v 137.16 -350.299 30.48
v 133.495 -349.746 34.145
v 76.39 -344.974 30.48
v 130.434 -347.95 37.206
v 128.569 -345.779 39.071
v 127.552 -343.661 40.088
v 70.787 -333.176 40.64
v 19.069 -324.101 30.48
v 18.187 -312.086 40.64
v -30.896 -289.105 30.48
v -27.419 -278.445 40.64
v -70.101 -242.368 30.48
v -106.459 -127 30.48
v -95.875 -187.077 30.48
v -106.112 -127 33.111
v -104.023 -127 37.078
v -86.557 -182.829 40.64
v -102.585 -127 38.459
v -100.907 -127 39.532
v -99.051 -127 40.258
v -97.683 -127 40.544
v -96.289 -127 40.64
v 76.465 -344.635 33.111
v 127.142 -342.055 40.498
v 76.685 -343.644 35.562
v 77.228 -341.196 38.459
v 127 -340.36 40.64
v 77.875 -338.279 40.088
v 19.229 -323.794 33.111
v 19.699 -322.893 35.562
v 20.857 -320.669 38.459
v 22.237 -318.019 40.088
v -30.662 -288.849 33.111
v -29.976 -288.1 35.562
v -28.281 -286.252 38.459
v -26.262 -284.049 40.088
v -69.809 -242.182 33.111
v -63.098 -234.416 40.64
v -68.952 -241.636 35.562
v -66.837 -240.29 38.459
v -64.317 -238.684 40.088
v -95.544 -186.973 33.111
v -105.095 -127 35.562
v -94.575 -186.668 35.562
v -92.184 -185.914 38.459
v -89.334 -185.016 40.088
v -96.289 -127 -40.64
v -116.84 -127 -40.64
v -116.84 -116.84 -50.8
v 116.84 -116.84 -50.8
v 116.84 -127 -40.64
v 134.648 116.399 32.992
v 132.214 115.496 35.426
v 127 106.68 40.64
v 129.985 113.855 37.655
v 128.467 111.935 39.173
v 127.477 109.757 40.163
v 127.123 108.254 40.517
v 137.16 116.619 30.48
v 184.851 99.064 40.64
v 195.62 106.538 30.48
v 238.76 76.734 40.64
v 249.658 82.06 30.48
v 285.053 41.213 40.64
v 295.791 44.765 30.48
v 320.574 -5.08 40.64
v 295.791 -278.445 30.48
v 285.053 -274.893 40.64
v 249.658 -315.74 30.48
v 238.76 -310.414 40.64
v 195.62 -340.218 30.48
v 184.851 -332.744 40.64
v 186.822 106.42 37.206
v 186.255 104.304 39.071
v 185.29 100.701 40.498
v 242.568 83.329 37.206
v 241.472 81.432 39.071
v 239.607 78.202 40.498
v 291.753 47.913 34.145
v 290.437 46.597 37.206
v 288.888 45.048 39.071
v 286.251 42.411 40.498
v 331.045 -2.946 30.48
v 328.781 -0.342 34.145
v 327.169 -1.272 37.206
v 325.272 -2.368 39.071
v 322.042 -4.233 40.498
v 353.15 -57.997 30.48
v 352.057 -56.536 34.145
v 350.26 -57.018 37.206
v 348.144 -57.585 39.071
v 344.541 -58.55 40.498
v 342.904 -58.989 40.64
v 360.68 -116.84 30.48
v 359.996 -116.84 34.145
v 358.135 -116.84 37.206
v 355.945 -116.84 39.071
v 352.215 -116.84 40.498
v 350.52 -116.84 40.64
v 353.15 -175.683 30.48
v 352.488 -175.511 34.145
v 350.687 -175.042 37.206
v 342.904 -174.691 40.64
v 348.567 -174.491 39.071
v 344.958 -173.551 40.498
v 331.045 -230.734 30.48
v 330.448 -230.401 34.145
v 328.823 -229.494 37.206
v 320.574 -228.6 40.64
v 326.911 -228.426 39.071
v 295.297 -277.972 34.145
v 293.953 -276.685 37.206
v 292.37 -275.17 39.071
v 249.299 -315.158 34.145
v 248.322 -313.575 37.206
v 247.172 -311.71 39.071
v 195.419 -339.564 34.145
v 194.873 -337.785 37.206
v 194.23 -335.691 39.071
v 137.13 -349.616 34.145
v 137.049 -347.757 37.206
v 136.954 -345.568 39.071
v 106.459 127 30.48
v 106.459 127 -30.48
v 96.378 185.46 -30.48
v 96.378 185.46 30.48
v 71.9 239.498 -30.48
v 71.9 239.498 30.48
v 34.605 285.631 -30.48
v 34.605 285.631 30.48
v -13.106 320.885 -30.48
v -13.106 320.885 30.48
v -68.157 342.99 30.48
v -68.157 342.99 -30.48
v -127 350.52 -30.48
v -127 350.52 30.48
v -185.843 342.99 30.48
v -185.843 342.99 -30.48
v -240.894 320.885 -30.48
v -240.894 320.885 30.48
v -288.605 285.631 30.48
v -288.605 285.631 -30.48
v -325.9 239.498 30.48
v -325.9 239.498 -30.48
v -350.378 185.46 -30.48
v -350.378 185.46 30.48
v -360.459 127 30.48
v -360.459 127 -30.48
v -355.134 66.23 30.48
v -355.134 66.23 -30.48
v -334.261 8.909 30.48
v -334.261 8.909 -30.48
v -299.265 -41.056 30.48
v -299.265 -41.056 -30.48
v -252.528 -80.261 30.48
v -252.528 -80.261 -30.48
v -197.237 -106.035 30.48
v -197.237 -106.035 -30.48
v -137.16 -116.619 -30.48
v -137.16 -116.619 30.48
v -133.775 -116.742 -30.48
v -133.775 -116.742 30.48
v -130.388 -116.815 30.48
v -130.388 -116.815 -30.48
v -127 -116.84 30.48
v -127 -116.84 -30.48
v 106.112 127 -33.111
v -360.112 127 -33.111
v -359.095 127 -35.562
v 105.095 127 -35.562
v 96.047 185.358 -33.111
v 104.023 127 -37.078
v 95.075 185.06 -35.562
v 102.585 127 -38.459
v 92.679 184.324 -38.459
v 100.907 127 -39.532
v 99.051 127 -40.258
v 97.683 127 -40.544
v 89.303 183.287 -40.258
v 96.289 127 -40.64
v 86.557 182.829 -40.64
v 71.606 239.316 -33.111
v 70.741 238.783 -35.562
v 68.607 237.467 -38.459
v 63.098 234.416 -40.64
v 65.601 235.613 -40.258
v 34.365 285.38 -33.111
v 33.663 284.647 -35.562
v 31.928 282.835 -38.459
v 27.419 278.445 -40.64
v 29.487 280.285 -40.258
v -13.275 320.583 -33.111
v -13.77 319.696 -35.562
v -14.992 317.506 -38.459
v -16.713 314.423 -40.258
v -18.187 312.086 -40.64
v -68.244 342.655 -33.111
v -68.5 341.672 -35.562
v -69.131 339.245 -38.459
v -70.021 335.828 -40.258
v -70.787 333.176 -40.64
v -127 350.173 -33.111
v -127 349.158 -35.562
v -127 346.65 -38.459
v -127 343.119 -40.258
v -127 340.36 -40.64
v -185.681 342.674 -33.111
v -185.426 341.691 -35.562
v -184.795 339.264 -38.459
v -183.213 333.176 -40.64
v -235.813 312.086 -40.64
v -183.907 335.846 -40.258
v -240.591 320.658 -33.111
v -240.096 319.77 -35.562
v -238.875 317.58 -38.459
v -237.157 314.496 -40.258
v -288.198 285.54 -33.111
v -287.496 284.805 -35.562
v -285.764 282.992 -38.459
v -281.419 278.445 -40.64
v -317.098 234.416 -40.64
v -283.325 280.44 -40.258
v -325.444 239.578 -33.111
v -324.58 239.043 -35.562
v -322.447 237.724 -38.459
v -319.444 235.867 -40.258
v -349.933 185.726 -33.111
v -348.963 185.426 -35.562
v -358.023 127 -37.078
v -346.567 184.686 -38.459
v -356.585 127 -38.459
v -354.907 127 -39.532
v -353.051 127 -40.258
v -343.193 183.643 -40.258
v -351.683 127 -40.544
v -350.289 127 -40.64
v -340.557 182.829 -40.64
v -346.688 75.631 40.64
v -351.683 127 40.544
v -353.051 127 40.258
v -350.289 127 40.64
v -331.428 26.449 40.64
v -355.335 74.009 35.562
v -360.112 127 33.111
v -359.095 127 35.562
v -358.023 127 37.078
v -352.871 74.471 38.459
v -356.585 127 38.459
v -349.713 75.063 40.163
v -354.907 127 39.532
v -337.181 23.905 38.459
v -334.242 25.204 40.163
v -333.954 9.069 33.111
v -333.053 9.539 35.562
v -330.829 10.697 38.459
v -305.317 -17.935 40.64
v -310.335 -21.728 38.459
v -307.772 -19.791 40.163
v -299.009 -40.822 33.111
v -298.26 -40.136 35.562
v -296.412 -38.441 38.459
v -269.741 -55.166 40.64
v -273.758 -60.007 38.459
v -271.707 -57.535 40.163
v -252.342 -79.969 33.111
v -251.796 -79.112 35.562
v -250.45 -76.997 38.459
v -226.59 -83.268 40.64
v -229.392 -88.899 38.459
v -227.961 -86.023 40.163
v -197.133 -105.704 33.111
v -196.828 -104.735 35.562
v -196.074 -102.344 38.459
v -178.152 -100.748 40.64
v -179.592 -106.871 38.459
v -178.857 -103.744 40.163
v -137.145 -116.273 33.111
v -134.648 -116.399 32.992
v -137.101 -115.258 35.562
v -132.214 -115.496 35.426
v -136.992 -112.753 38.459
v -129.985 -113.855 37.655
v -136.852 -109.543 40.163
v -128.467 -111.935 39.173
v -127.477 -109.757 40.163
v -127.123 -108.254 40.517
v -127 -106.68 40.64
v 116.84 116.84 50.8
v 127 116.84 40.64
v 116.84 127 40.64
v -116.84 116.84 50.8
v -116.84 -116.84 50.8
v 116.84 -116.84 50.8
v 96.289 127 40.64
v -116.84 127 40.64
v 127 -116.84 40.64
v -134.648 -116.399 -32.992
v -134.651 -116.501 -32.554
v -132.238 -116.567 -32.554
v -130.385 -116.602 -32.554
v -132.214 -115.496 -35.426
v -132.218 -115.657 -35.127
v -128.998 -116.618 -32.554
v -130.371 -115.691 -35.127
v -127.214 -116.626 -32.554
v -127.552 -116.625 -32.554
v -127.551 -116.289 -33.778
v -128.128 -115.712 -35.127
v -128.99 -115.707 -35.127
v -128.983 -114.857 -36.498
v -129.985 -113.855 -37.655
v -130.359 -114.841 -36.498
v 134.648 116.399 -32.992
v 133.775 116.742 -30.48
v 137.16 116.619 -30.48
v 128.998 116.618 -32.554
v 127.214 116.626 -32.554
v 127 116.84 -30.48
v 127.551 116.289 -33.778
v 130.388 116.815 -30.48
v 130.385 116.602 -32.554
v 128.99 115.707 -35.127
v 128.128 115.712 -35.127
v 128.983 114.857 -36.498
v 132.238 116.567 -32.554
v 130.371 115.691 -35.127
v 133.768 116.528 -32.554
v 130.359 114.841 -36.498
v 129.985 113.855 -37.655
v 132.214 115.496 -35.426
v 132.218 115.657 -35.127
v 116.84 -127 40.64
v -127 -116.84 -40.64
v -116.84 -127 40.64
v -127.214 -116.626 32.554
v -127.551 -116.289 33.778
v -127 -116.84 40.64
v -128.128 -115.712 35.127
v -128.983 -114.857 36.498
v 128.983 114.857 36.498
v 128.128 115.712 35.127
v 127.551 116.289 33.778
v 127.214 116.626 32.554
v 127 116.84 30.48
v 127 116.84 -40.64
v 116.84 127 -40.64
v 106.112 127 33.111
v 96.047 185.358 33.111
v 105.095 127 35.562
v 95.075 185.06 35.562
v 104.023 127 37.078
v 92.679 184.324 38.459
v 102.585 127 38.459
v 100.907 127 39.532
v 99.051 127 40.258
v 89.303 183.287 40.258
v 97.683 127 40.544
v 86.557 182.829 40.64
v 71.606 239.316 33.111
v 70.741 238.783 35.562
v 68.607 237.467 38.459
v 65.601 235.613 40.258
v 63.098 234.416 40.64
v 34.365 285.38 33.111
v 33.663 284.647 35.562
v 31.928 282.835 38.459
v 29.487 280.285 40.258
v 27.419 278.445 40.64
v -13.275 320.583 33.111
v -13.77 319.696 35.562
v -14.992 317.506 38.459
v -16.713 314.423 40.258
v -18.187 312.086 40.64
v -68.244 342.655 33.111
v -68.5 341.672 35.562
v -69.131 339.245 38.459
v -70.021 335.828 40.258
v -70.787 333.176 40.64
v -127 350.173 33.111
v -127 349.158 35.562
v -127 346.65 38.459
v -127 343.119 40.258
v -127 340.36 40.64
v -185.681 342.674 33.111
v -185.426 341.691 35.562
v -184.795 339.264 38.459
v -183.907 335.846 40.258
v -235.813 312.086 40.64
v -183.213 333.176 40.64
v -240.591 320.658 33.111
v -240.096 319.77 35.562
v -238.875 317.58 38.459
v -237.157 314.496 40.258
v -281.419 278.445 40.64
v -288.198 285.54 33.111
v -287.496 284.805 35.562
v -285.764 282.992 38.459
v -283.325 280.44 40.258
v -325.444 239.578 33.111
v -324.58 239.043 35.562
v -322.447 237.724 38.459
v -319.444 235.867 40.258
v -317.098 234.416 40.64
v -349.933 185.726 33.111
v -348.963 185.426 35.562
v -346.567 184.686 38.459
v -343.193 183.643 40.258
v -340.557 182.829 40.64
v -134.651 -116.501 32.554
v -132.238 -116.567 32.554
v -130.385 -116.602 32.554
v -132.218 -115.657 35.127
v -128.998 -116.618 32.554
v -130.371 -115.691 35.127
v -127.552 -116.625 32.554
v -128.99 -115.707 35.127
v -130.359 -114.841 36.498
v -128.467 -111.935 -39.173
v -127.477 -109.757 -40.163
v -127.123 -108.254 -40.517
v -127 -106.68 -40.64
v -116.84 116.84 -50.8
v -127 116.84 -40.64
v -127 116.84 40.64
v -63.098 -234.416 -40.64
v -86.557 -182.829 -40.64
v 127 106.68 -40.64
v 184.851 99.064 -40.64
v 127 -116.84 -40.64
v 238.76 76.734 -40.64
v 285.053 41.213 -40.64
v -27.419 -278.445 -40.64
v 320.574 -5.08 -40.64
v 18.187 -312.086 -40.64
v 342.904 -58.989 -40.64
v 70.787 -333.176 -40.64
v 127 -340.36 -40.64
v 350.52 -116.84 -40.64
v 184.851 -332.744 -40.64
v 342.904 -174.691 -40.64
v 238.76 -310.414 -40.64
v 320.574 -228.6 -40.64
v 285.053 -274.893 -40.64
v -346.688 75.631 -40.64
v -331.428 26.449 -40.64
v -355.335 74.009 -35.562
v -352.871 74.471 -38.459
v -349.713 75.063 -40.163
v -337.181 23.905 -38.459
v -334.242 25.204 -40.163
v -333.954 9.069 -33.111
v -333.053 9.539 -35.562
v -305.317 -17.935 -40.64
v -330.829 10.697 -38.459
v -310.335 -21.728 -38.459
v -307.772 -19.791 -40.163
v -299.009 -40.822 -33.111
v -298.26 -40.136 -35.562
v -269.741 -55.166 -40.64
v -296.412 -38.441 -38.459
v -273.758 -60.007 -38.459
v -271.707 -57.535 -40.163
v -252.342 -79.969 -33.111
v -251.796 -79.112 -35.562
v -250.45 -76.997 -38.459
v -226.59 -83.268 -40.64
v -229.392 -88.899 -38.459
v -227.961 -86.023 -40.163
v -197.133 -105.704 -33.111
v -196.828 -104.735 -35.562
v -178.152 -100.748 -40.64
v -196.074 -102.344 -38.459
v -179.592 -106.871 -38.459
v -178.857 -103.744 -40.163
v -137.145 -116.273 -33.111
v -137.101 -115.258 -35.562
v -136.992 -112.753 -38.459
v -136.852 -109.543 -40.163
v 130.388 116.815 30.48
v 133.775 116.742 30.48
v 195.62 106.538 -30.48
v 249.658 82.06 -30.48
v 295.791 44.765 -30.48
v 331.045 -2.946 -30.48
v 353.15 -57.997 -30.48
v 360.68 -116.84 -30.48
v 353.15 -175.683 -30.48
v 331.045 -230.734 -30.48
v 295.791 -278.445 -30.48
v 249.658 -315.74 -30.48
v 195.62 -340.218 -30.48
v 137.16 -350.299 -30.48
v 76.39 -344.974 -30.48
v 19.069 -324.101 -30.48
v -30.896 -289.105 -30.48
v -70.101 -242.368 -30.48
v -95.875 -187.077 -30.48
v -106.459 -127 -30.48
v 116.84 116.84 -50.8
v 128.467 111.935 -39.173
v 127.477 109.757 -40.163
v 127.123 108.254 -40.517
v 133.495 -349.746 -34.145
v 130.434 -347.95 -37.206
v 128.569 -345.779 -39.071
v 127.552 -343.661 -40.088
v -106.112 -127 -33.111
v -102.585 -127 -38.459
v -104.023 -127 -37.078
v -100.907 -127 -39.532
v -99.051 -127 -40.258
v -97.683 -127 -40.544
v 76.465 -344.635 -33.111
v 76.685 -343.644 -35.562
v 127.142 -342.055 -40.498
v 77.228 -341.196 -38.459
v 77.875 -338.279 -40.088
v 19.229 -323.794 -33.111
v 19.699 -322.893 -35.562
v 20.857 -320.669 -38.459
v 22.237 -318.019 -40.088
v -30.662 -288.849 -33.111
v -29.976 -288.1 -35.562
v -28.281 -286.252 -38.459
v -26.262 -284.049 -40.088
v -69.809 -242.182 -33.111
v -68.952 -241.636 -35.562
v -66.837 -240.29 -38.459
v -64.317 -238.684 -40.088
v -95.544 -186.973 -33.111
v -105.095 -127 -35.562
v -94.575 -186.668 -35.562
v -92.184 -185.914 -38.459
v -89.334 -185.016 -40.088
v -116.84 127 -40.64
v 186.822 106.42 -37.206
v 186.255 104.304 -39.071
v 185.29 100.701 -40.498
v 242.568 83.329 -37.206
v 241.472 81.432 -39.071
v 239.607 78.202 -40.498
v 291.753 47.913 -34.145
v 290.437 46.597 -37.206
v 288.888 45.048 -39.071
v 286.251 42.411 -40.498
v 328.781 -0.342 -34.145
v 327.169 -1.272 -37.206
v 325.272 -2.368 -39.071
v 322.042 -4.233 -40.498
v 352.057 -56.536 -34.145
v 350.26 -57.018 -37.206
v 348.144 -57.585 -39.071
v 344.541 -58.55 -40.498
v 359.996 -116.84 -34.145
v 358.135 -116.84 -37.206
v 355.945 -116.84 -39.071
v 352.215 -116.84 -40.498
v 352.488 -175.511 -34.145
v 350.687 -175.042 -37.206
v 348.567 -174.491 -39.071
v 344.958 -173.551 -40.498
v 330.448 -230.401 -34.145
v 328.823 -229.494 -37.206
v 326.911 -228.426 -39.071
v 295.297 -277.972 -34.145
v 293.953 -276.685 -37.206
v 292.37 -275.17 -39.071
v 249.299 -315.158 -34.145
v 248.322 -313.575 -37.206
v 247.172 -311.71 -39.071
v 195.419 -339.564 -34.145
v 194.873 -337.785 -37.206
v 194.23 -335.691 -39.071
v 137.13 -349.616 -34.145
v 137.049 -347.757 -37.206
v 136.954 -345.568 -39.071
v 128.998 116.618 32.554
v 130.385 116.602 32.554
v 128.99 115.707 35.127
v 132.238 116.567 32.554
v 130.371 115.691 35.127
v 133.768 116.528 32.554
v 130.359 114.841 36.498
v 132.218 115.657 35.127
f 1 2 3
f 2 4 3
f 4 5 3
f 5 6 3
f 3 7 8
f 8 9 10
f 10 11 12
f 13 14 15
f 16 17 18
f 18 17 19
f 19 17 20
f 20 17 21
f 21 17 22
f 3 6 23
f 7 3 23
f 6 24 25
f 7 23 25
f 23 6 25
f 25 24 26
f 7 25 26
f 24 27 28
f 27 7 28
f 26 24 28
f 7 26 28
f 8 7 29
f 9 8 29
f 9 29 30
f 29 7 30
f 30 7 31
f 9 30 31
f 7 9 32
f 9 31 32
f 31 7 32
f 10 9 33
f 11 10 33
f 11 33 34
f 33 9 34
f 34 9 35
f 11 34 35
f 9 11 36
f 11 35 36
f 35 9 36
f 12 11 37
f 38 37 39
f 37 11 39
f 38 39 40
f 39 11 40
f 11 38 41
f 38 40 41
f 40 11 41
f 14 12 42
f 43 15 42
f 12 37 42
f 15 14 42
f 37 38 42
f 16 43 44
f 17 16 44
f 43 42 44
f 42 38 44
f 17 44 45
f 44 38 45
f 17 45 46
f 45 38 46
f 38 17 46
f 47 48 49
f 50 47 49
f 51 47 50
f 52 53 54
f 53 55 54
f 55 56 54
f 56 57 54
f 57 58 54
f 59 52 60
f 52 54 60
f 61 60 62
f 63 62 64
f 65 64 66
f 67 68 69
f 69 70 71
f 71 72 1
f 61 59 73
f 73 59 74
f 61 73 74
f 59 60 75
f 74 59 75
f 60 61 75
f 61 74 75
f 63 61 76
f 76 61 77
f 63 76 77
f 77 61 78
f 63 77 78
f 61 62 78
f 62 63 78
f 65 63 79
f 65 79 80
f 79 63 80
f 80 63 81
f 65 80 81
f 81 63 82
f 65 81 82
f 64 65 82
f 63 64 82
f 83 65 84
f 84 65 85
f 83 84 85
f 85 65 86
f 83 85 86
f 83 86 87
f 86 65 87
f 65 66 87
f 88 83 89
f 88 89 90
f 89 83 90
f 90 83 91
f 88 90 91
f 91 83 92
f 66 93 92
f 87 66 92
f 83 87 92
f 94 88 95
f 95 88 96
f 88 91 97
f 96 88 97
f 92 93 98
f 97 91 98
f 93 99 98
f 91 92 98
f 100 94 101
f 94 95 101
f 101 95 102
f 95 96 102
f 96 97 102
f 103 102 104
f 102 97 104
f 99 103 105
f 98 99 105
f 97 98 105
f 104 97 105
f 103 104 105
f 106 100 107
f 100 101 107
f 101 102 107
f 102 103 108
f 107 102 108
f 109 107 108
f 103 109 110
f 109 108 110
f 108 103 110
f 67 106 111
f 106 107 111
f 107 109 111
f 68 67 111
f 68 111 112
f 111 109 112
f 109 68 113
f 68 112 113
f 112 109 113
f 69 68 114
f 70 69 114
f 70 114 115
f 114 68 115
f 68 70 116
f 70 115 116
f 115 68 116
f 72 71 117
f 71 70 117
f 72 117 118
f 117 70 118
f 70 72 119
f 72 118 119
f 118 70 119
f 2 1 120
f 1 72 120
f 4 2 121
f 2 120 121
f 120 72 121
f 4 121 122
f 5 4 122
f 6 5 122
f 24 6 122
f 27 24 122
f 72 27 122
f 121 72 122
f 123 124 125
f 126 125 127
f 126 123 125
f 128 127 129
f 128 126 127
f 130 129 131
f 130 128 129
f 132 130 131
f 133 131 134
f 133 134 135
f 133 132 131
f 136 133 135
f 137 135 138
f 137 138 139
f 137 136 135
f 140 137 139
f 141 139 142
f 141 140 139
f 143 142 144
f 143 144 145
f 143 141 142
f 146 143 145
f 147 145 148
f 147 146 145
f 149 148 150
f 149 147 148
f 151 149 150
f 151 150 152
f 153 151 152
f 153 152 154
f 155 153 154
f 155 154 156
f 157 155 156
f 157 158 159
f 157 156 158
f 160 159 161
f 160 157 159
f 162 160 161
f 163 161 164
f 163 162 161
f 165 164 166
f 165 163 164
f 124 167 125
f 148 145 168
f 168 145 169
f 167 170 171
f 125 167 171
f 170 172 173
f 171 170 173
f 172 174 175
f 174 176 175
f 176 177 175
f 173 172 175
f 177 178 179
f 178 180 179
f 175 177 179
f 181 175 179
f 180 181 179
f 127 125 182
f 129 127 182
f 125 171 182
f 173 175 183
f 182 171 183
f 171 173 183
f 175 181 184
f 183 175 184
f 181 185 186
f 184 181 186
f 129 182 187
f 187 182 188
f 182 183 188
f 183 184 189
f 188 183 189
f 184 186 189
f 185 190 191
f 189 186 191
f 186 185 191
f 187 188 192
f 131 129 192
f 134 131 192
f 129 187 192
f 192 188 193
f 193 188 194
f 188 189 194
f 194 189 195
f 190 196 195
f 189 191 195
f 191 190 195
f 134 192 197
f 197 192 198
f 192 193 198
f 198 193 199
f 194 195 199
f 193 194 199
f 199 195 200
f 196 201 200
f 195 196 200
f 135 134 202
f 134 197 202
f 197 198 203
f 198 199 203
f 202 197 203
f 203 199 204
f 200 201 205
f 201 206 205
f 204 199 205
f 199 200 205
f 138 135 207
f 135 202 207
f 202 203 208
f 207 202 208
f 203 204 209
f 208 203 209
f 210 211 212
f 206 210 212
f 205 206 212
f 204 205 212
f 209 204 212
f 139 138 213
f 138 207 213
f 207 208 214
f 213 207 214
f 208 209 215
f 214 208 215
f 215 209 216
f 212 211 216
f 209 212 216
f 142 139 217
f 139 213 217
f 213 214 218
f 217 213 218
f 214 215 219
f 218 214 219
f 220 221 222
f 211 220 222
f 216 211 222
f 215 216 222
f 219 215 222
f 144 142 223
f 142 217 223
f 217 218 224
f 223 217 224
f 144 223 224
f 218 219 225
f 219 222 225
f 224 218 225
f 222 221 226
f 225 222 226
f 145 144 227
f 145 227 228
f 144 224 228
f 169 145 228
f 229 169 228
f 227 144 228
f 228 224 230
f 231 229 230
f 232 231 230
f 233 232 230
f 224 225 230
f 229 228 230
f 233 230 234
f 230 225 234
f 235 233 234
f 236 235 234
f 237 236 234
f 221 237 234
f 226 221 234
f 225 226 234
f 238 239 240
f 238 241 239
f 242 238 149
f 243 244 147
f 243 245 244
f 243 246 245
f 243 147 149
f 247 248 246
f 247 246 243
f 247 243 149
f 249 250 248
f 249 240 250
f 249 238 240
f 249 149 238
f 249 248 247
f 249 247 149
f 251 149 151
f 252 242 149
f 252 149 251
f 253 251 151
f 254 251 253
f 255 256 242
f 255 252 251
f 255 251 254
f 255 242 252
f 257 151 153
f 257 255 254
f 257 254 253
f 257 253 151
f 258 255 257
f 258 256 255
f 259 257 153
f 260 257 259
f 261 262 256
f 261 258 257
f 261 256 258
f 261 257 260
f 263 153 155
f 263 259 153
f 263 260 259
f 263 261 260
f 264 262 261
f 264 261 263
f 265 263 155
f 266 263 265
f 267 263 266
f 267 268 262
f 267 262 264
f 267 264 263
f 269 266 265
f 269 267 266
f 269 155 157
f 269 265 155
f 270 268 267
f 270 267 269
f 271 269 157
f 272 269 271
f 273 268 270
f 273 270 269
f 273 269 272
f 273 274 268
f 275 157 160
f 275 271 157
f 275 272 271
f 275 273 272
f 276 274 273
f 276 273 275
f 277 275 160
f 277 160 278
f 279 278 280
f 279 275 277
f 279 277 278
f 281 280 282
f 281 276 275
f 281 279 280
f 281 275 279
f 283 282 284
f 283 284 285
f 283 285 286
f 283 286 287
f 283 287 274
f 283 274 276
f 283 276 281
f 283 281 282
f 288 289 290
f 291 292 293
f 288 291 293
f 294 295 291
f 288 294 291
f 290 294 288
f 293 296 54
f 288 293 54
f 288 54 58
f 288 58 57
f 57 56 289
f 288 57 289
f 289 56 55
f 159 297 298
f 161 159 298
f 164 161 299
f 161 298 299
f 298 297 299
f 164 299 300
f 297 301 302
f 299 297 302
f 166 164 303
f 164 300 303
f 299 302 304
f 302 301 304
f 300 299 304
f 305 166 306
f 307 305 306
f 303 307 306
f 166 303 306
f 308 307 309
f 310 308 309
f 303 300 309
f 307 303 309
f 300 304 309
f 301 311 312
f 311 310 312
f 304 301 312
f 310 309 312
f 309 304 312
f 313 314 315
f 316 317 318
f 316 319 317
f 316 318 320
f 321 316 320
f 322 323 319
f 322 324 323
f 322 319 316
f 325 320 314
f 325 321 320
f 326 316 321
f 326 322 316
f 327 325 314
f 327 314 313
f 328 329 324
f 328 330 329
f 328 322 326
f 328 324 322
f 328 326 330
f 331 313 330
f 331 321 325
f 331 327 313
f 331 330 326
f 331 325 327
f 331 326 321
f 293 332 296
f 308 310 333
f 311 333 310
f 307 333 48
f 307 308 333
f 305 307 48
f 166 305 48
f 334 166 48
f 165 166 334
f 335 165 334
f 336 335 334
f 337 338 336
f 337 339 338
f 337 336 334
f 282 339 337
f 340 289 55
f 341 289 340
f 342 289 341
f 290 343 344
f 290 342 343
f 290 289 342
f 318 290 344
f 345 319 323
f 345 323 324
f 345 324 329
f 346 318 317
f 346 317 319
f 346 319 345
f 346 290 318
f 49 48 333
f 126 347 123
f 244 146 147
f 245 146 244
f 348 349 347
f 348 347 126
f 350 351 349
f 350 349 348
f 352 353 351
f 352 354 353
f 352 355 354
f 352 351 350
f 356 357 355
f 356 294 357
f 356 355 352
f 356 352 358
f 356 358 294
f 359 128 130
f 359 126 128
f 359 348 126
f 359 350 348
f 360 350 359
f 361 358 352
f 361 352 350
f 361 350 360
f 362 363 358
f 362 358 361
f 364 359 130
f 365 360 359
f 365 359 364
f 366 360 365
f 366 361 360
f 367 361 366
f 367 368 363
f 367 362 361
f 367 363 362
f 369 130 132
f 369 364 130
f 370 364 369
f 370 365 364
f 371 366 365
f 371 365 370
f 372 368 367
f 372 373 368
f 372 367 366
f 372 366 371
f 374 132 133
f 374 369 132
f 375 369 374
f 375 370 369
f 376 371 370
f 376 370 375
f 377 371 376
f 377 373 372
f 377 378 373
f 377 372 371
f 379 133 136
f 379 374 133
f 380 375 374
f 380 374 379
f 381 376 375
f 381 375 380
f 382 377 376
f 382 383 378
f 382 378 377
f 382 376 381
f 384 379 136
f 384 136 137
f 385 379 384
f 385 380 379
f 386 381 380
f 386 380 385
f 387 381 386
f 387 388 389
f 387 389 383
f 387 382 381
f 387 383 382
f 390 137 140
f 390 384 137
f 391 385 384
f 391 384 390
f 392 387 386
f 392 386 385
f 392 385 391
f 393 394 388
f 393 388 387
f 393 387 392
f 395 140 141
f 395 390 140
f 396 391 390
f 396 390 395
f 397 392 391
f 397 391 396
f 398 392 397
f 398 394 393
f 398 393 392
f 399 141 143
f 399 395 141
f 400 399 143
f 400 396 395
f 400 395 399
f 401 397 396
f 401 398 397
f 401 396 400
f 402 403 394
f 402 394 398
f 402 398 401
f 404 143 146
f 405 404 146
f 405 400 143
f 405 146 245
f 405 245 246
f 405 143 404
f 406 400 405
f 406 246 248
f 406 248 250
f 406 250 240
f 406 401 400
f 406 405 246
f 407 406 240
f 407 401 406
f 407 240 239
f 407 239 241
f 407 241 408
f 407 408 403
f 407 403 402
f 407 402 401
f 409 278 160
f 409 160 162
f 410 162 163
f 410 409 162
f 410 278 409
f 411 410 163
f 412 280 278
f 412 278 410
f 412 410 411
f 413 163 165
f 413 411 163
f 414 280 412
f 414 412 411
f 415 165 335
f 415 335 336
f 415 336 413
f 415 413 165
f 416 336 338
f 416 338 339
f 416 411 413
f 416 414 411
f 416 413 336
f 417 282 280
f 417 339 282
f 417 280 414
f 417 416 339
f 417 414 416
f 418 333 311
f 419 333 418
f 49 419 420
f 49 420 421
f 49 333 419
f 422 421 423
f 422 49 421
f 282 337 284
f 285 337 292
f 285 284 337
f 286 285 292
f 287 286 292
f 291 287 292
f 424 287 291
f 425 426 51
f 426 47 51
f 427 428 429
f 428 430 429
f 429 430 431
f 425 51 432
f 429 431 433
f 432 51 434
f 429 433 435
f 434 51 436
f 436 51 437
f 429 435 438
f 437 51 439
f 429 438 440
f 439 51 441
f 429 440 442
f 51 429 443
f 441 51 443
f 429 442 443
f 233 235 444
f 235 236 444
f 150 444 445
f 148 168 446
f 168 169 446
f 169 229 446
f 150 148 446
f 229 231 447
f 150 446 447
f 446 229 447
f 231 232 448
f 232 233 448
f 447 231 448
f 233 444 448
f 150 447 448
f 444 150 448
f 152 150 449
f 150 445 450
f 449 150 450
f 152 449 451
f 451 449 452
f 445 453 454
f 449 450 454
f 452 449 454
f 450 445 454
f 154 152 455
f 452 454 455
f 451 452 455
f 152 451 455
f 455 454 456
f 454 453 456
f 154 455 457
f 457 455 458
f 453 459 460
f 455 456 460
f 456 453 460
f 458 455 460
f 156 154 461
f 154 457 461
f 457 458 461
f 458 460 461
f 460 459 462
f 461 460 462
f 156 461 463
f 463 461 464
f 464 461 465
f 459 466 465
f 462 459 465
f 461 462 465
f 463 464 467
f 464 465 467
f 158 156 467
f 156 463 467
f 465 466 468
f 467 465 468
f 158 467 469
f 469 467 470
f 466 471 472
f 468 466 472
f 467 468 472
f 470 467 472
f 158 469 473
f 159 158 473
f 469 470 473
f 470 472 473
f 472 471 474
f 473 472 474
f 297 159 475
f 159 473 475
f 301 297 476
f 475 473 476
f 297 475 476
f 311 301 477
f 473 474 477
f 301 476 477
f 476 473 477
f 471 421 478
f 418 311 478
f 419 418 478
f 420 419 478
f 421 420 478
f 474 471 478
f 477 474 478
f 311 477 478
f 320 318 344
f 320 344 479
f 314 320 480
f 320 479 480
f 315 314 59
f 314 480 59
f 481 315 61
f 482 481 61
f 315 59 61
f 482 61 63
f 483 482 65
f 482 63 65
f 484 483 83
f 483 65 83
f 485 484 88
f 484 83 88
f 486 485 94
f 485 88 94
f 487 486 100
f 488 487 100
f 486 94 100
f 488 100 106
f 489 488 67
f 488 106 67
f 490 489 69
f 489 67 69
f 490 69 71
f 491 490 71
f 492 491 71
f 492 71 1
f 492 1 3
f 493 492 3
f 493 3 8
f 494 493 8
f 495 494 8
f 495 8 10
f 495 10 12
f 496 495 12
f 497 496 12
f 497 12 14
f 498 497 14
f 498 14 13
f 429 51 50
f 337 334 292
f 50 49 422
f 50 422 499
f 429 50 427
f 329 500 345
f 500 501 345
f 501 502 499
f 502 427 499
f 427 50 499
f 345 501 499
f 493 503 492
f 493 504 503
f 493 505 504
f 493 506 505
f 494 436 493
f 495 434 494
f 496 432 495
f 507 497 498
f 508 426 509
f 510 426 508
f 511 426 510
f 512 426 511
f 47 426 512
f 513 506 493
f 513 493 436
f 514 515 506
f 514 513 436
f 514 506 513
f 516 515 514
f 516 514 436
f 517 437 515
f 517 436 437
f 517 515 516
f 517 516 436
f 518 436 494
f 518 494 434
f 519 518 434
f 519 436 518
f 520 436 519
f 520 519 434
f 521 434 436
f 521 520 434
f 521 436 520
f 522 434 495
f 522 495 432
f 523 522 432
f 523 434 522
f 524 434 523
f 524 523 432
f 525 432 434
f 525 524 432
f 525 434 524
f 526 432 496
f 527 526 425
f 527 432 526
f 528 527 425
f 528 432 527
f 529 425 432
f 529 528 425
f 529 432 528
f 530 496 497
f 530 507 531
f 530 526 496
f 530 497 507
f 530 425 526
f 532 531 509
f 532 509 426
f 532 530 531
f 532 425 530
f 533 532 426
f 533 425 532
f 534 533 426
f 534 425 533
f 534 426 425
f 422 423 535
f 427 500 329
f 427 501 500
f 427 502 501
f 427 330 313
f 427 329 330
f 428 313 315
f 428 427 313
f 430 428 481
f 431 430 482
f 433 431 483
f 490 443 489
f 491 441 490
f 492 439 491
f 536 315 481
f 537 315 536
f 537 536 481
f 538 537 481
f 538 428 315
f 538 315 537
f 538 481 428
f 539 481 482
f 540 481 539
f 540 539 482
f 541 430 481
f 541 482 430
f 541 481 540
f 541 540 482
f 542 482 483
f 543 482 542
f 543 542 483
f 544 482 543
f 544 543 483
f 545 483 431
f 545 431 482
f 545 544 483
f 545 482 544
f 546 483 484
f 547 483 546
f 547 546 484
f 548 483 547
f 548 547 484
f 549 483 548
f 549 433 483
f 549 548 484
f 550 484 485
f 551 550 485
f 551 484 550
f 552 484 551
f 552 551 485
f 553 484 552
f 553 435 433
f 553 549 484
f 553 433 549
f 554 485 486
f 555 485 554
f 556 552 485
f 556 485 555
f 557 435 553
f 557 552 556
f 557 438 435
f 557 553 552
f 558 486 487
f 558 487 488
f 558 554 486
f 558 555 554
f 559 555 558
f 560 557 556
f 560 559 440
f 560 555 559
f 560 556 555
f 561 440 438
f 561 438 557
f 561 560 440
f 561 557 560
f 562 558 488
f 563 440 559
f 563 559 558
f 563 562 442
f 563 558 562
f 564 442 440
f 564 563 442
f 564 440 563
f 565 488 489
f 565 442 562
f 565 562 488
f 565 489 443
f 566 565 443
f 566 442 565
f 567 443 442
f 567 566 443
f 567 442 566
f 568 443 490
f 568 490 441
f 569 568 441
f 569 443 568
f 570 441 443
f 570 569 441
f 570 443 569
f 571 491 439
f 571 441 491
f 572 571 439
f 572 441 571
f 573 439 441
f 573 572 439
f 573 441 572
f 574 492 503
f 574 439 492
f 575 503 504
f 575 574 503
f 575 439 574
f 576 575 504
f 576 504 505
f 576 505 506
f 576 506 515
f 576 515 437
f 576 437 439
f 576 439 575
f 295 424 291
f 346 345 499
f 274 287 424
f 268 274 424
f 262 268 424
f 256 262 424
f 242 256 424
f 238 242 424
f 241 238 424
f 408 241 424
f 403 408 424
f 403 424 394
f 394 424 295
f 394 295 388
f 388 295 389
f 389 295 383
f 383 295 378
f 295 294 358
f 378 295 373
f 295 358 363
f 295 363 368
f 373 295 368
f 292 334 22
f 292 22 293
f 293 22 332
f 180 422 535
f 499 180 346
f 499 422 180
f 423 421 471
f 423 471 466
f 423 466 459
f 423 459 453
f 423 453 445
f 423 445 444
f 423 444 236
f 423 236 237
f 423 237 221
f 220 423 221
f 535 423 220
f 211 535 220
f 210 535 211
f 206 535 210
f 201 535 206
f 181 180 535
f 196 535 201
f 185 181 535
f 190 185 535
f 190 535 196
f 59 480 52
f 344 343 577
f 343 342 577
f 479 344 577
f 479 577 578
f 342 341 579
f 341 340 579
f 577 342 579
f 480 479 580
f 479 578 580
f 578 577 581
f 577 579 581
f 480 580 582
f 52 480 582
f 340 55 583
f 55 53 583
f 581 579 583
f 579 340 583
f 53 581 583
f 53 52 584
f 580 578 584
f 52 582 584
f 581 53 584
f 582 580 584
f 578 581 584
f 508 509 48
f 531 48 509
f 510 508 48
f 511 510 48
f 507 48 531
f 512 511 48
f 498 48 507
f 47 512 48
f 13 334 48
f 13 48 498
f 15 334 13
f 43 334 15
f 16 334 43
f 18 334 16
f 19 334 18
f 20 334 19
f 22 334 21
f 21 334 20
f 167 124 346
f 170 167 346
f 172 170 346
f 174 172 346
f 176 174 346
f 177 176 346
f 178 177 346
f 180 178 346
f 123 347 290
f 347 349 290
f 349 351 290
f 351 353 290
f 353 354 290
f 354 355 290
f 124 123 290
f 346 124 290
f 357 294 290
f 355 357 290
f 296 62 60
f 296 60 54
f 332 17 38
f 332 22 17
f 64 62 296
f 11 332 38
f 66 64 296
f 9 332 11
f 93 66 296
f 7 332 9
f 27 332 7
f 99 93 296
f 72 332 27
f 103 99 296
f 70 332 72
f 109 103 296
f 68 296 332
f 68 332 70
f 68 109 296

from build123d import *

# Parameters (mm, degrees)
F0_W          = 254
F0_H          = 254
F1_DEPTH      = 50.8
F1_DEPTH_BACK = 50.8
F2_SIZE       = 10.16
F1_FACE_W     = 233.68
F1_FACE_H     = 81.28
F1_FACE1_W    = 233.68
F1_FACE1_H    = 81.28
F5_T4_ANGLE   = 280.0079997231
F5_T9_ANGLE   = 280.0079997231
F5_T14_ANGLE  = 280.0079997231
F5_T19_ANGLE  = 280.0079997231
F5_T24_ANGLE  = 280.0079997231
F5_T29_ANGLE  = 280.0079997231
F5_T34_ANGLE  = 280.0079997231
F5_T39_ANGLE  = 280.0079997231
F5_T44_ANGLE  = 280.0079997231
F5_T49_ANGLE  = 280.0079997231
F5_T54_ANGLE  = 280.0079997231
F5_T59_ANGLE  = 280.0079997231


# Not quite as in the source:
# - a fillet or chamfer that OpenCascade refuses, or shapes differently, is made with other operations: its cross-section is extruded or revolved along the edge and cut away or added


with BuildPart() as f1:
    # F0 (on Top) → F1 (new body, two sides)
    with BuildSketch(Plane.XY) as f1_sk:
        Rectangle(F0_W, F0_H)
    extrude(amount=F1_DEPTH)
    extrude(f1_sk.sketch, amount=-F1_DEPTH_BACK)

    # F2
    f2_edges = [f1.edges().sort_by_distance(p)[0] for p in [
        (0, -127, 50.8),
        (127, -127, 0),
        (127, 0, 50.8),
        (-127, -127, 0),
        (0, -127, -50.8),
        (127, 0, -50.8),
        (127, 127, 0),
        (-127, 0, 50.8),
        (-127, 0, -50.8),
        (-127, 127, 0),
        (0, 127, 50.8),
        (0, 127, -50.8),
    ]]
    chamfer(f2_edges, length=F2_SIZE)

    # F1_face (on face) → F3 (revolve)
    with BuildSketch(Plane.YZ.offset(127)):
        Rectangle(F1_FACE_W, F1_FACE_H)
    revolve(axis=Axis((127, -116.84, 0), (0, 0, -1)))

    # F1_face1 (on face) → F4 (revolve)
    with BuildSketch(Plane(origin=(-127, 0, 0), x_dir=(0, -1, 0), z_dir=(-1, 0, 0))):
        Rectangle(F1_FACE1_W, F1_FACE1_H)
    revolve(axis=Axis((-127, 116.84, 0), (0, 0, 1)))

    # F5: fillet of radius 10.16 on 4 edges, made by hand


with BuildPart() as f5_tool2:
    # F5_s3 → F5_t4 (revolve)
    with BuildSketch(Plane(origin=(112.850510213, 12.3590473355, 0), x_dir=(0, 0, 1), z_dir=(-0.9940564274, -0.1088660602, 0))):
        with BuildLine():
            ThreePointArc((30.48, 103.70845737), (37.6642048969, 100.7326622668), (40.64, 93.54845737))
            Line((40.64, 93.54845737), (40.64, 103.70845737))
            Line((40.64, 103.70845737), (30.48, 103.70845737))
        make_face()
    revolve(axis=Axis((127, -116.84, 40.64), (0, 0, -1)), revolution_arc=F5_T4_ANGLE)

    split(bisect_by=Plane(origin=(83.82, 0, 83.82), x_dir=(0, 1, 0), z_dir=(0.7071067812, 0, 0.7071067812)), keep=Keep.TOP)


with BuildPart() as f1_1:
    add(f1.part)

    # F5_t1: cut F5_tool2
    add(f5_tool2.part, mode=Mode.SUBTRACT)


with BuildPart() as f5_tool7:
    # F5_s8 → F5_t9 (revolve)
    with BuildSketch(Plane(origin=(112.850510213, 12.3590473355, 0), x_dir=(0, 0, 1), z_dir=(-0.9940564274, -0.1088660602, 0))):
        with BuildLine():
            ThreePointArc((30.48, 103.70845737), (37.6642048969, 100.7326622668), (40.64, 93.54845737))
            Line((40.64, 93.54845737), (40.64, 103.70845737))
            Line((40.64, 103.70845737), (30.48, 103.70845737))
        make_face()
    revolve(axis=Axis((127, -116.84, 40.64), (0, 0, -1)), revolution_arc=F5_T9_ANGLE)

    split(bisect_by=Plane(origin=(121.92, 121.92, 0), x_dir=(0, 0, 1), z_dir=(0.7071067812, 0.7071067812, 0)), keep=Keep.TOP)


with BuildPart() as f1_2:
    add(f1_1.part)

    # F5_t6: cut F5_tool7
    add(f5_tool7.part, mode=Mode.SUBTRACT)


with BuildPart() as f5_tool12:
    # F5_s13 → F5_t14 (revolve)
    with BuildSketch(Plane(origin=(112.850510213, 12.3590473355, 0), x_dir=(0, 0, 1), z_dir=(-0.9940564274, -0.1088660602, 0))):
        with BuildLine():
            ThreePointArc((30.48, 103.70845737), (37.6642048969, 100.7326622668), (40.64, 93.54845737))
            Line((40.64, 93.54845737), (40.64, 103.70845737))
            Line((40.64, 103.70845737), (30.48, 103.70845737))
        make_face()
    revolve(axis=Axis((127, -116.84, 40.64), (0, 0, -1)), revolution_arc=F5_T14_ANGLE)

    split(bisect_by=Plane.XZ.offset(127), keep=Keep.TOP)


with BuildPart() as f1_3:
    add(f1_2.part)

    # F5_t11: cut F5_tool12
    add(f5_tool12.part, mode=Mode.SUBTRACT)


with BuildPart() as f5_tool17:
    # F5_s18 → F5_t19 (revolve)
    with BuildSketch(Plane(origin=(112.850510213, 12.3590473355, 0), x_dir=(0, 0, 1), z_dir=(-0.9940564274, -0.1088660602, 0))):
        with BuildLine():
            ThreePointArc((-30.48, 103.70845737), (-37.6642048969, 100.7326622668), (-40.64, 93.54845737))
            Line((-40.64, 93.54845737), (-40.64, 103.70845737))
            Line((-40.64, 103.70845737), (-30.48, 103.70845737))
        make_face()
    revolve(axis=Axis((127, -116.84, -40.64), (0, 0, -1)), revolution_arc=F5_T19_ANGLE)

    split(bisect_by=Plane(origin=(83.82, 0, -83.82), x_dir=(0, 1, 0), z_dir=(0.7071067812, 0, -0.7071067812)), keep=Keep.TOP)


with BuildPart() as f1_4:
    add(f1_3.part)

    # F5_t16: cut F5_tool17
    add(f5_tool17.part, mode=Mode.SUBTRACT)


with BuildPart() as f5_tool22:
    # F5_s23 → F5_t24 (revolve)
    with BuildSketch(Plane(origin=(112.850510213, 12.3590473355, 0), x_dir=(0, 0, 1), z_dir=(-0.9940564274, -0.1088660602, 0))):
        with BuildLine():
            ThreePointArc((-30.48, 103.70845737), (-37.6642048969, 100.7326622668), (-40.64, 93.54845737))
            Line((-40.64, 93.54845737), (-40.64, 103.70845737))
            Line((-40.64, 103.70845737), (-30.48, 103.70845737))
        make_face()
    revolve(axis=Axis((127, -116.84, -40.64), (0, 0, -1)), revolution_arc=F5_T24_ANGLE)

    split(bisect_by=Plane(origin=(121.92, 121.92, 0), x_dir=(0, 0, 1), z_dir=(0.7071067812, 0.7071067812, 0)), keep=Keep.TOP)


with BuildPart() as f1_5:
    add(f1_4.part)

    # F5_t21: cut F5_tool22
    add(f5_tool22.part, mode=Mode.SUBTRACT)


with BuildPart() as f5_tool27:
    # F5_s28 → F5_t29 (revolve)
    with BuildSketch(Plane(origin=(112.850510213, 12.3590473355, 0), x_dir=(0, 0, 1), z_dir=(-0.9940564274, -0.1088660602, 0))):
        with BuildLine():
            ThreePointArc((-30.48, 103.70845737), (-37.6642048969, 100.7326622668), (-40.64, 93.54845737))
            Line((-40.64, 93.54845737), (-40.64, 103.70845737))
            Line((-40.64, 103.70845737), (-30.48, 103.70845737))
        make_face()
    revolve(axis=Axis((127, -116.84, -40.64), (0, 0, -1)), revolution_arc=F5_T29_ANGLE)

    split(bisect_by=Plane.XZ.offset(127), keep=Keep.TOP)


with BuildPart() as f1_6:
    add(f1_5.part)

    # F5_t26: cut F5_tool27
    add(f5_tool27.part, mode=Mode.SUBTRACT)


with BuildPart() as f5_tool32:
    # F5_s33 → F5_t34 (revolve)
    with BuildSketch(Plane(origin=(7.0960267411, 108.0319683984, 0), x_dir=(0, 0, 1), z_dir=(-0.0655432689, -0.9978497281, 0))):
        with BuildLine():
            ThreePointArc((-30.48, -99.2950089912), (-37.6642048969, -96.319213888), (-40.64, -89.1350089912))
            Line((-40.64, -89.1350089912), (-40.64, -99.2950089912))
            Line((-40.64, -99.2950089912), (-30.48, -99.2950089912))
        make_face()
    revolve(axis=Axis((-127, 116.84, -40.64), (0, 0, 1)), revolution_arc=F5_T34_ANGLE)

    split(bisect_by=Plane.XZ.offset(-127), keep=Keep.BOTTOM)


with BuildPart() as f1_7:
    add(f1_6.part)

    # F5_t31: cut F5_tool32
    add(f5_tool32.part, mode=Mode.SUBTRACT)


with BuildPart() as f5_tool37:
    # F5_s38 → F5_t39 (revolve)
    with BuildSketch(Plane(origin=(7.0960267411, 108.0319683984, 0), x_dir=(0, 0, 1), z_dir=(-0.0655432689, -0.9978497281, 0))):
        with BuildLine():
            ThreePointArc((-30.48, -99.2950089912), (-37.6642048969, -96.319213888), (-40.64, -89.1350089912))
            Line((-40.64, -89.1350089912), (-40.64, -99.2950089912))
            Line((-40.64, -99.2950089912), (-30.48, -99.2950089912))
        make_face()
    revolve(axis=Axis((-127, 116.84, -40.64), (0, 0, 1)), revolution_arc=F5_T39_ANGLE)

    split(bisect_by=Plane(origin=(-83.82, 0, -83.82), x_dir=(0, 1, 0), z_dir=(-0.7071067812, 0, -0.7071067812)), keep=Keep.TOP)


with BuildPart() as f1_8:
    add(f1_7.part)

    # F5_t36: cut F5_tool37
    add(f5_tool37.part, mode=Mode.SUBTRACT)


with BuildPart() as f5_tool42:
    # F5_s43 → F5_t44 (revolve)
    with BuildSketch(Plane(origin=(7.0960267411, 108.0319683984, 0), x_dir=(0, 0, 1), z_dir=(-0.0655432689, -0.9978497281, 0))):
        with BuildLine():
            ThreePointArc((-30.48, -99.2950089912), (-37.6642048969, -96.319213888), (-40.64, -89.1350089912))
            Line((-40.64, -89.1350089912), (-40.64, -99.2950089912))
            Line((-40.64, -99.2950089912), (-30.48, -99.2950089912))
        make_face()
    revolve(axis=Axis((-127, 116.84, -40.64), (0, 0, 1)), revolution_arc=F5_T44_ANGLE)

    split(bisect_by=Plane(origin=(-121.92, -121.92, 0), x_dir=(0, 0, 1), z_dir=(-0.7071067812, -0.7071067812, 0)), keep=Keep.TOP)


with BuildPart() as f1_9:
    add(f1_8.part)

    # F5_t41: cut F5_tool42
    add(f5_tool42.part, mode=Mode.SUBTRACT)


with BuildPart() as f5_tool47:
    # F5_s48 → F5_t49 (revolve)
    with BuildSketch(Plane(origin=(7.0960267411, 108.0319683984, 0), x_dir=(0, 0, 1), z_dir=(-0.0655432689, -0.9978497281, 0))):
        with BuildLine():
            ThreePointArc((30.48, -99.2950089912), (37.6642048969, -96.319213888), (40.64, -89.1350089912))
            Line((40.64, -89.1350089912), (40.64, -99.2950089912))
            Line((40.64, -99.2950089912), (30.48, -99.2950089912))
        make_face()
    revolve(axis=Axis((-127, 116.84, 40.64), (0, 0, 1)), revolution_arc=F5_T49_ANGLE)

    split(bisect_by=Plane.XZ.offset(-127), keep=Keep.BOTTOM)


with BuildPart() as f1_10:
    add(f1_9.part)

    # F5_t46: cut F5_tool47
    add(f5_tool47.part, mode=Mode.SUBTRACT)


with BuildPart() as f5_tool52:
    # F5_s53 → F5_t54 (revolve)
    with BuildSketch(Plane(origin=(7.0960267411, 108.0319683984, 0), x_dir=(0, 0, 1), z_dir=(-0.0655432689, -0.9978497281, 0))):
        with BuildLine():
            ThreePointArc((30.48, -99.2950089912), (37.6642048969, -96.319213888), (40.64, -89.1350089912))
            Line((40.64, -89.1350089912), (40.64, -99.2950089912))
            Line((40.64, -99.2950089912), (30.48, -99.2950089912))
        make_face()
    revolve(axis=Axis((-127, 116.84, 40.64), (0, 0, 1)), revolution_arc=F5_T54_ANGLE)

    split(bisect_by=Plane(origin=(-83.82, 0, 83.82), x_dir=(0, 1, 0), z_dir=(-0.7071067812, 0, 0.7071067812)), keep=Keep.TOP)


with BuildPart() as f1_11:
    add(f1_10.part)

    # F5_t51: cut F5_tool52
    add(f5_tool52.part, mode=Mode.SUBTRACT)


with BuildPart() as f5_tool57:
    # F5_s58 → F5_t59 (revolve)
    with BuildSketch(Plane(origin=(7.0960267411, 108.0319683984, 0), x_dir=(0, 0, 1), z_dir=(-0.0655432689, -0.9978497281, 0))):
        with BuildLine():
            ThreePointArc((30.48, -99.2950089912), (37.6642048969, -96.319213888), (40.64, -89.1350089912))
            Line((40.64, -89.1350089912), (40.64, -99.2950089912))
            Line((40.64, -99.2950089912), (30.48, -99.2950089912))
        make_face()
    revolve(axis=Axis((-127, 116.84, 40.64), (0, 0, 1)), revolution_arc=F5_T59_ANGLE)

    split(bisect_by=Plane(origin=(-121.92, -121.92, 0), x_dir=(0, 0, 1), z_dir=(-0.7071067812, -0.7071067812, 0)), keep=Keep.TOP)


with BuildPart() as f1_12:
    add(f1_11.part)

    # F5_t56: cut F5_tool57
    add(f5_tool57.part, mode=Mode.SUBTRACT)


solid = f1_12.part
